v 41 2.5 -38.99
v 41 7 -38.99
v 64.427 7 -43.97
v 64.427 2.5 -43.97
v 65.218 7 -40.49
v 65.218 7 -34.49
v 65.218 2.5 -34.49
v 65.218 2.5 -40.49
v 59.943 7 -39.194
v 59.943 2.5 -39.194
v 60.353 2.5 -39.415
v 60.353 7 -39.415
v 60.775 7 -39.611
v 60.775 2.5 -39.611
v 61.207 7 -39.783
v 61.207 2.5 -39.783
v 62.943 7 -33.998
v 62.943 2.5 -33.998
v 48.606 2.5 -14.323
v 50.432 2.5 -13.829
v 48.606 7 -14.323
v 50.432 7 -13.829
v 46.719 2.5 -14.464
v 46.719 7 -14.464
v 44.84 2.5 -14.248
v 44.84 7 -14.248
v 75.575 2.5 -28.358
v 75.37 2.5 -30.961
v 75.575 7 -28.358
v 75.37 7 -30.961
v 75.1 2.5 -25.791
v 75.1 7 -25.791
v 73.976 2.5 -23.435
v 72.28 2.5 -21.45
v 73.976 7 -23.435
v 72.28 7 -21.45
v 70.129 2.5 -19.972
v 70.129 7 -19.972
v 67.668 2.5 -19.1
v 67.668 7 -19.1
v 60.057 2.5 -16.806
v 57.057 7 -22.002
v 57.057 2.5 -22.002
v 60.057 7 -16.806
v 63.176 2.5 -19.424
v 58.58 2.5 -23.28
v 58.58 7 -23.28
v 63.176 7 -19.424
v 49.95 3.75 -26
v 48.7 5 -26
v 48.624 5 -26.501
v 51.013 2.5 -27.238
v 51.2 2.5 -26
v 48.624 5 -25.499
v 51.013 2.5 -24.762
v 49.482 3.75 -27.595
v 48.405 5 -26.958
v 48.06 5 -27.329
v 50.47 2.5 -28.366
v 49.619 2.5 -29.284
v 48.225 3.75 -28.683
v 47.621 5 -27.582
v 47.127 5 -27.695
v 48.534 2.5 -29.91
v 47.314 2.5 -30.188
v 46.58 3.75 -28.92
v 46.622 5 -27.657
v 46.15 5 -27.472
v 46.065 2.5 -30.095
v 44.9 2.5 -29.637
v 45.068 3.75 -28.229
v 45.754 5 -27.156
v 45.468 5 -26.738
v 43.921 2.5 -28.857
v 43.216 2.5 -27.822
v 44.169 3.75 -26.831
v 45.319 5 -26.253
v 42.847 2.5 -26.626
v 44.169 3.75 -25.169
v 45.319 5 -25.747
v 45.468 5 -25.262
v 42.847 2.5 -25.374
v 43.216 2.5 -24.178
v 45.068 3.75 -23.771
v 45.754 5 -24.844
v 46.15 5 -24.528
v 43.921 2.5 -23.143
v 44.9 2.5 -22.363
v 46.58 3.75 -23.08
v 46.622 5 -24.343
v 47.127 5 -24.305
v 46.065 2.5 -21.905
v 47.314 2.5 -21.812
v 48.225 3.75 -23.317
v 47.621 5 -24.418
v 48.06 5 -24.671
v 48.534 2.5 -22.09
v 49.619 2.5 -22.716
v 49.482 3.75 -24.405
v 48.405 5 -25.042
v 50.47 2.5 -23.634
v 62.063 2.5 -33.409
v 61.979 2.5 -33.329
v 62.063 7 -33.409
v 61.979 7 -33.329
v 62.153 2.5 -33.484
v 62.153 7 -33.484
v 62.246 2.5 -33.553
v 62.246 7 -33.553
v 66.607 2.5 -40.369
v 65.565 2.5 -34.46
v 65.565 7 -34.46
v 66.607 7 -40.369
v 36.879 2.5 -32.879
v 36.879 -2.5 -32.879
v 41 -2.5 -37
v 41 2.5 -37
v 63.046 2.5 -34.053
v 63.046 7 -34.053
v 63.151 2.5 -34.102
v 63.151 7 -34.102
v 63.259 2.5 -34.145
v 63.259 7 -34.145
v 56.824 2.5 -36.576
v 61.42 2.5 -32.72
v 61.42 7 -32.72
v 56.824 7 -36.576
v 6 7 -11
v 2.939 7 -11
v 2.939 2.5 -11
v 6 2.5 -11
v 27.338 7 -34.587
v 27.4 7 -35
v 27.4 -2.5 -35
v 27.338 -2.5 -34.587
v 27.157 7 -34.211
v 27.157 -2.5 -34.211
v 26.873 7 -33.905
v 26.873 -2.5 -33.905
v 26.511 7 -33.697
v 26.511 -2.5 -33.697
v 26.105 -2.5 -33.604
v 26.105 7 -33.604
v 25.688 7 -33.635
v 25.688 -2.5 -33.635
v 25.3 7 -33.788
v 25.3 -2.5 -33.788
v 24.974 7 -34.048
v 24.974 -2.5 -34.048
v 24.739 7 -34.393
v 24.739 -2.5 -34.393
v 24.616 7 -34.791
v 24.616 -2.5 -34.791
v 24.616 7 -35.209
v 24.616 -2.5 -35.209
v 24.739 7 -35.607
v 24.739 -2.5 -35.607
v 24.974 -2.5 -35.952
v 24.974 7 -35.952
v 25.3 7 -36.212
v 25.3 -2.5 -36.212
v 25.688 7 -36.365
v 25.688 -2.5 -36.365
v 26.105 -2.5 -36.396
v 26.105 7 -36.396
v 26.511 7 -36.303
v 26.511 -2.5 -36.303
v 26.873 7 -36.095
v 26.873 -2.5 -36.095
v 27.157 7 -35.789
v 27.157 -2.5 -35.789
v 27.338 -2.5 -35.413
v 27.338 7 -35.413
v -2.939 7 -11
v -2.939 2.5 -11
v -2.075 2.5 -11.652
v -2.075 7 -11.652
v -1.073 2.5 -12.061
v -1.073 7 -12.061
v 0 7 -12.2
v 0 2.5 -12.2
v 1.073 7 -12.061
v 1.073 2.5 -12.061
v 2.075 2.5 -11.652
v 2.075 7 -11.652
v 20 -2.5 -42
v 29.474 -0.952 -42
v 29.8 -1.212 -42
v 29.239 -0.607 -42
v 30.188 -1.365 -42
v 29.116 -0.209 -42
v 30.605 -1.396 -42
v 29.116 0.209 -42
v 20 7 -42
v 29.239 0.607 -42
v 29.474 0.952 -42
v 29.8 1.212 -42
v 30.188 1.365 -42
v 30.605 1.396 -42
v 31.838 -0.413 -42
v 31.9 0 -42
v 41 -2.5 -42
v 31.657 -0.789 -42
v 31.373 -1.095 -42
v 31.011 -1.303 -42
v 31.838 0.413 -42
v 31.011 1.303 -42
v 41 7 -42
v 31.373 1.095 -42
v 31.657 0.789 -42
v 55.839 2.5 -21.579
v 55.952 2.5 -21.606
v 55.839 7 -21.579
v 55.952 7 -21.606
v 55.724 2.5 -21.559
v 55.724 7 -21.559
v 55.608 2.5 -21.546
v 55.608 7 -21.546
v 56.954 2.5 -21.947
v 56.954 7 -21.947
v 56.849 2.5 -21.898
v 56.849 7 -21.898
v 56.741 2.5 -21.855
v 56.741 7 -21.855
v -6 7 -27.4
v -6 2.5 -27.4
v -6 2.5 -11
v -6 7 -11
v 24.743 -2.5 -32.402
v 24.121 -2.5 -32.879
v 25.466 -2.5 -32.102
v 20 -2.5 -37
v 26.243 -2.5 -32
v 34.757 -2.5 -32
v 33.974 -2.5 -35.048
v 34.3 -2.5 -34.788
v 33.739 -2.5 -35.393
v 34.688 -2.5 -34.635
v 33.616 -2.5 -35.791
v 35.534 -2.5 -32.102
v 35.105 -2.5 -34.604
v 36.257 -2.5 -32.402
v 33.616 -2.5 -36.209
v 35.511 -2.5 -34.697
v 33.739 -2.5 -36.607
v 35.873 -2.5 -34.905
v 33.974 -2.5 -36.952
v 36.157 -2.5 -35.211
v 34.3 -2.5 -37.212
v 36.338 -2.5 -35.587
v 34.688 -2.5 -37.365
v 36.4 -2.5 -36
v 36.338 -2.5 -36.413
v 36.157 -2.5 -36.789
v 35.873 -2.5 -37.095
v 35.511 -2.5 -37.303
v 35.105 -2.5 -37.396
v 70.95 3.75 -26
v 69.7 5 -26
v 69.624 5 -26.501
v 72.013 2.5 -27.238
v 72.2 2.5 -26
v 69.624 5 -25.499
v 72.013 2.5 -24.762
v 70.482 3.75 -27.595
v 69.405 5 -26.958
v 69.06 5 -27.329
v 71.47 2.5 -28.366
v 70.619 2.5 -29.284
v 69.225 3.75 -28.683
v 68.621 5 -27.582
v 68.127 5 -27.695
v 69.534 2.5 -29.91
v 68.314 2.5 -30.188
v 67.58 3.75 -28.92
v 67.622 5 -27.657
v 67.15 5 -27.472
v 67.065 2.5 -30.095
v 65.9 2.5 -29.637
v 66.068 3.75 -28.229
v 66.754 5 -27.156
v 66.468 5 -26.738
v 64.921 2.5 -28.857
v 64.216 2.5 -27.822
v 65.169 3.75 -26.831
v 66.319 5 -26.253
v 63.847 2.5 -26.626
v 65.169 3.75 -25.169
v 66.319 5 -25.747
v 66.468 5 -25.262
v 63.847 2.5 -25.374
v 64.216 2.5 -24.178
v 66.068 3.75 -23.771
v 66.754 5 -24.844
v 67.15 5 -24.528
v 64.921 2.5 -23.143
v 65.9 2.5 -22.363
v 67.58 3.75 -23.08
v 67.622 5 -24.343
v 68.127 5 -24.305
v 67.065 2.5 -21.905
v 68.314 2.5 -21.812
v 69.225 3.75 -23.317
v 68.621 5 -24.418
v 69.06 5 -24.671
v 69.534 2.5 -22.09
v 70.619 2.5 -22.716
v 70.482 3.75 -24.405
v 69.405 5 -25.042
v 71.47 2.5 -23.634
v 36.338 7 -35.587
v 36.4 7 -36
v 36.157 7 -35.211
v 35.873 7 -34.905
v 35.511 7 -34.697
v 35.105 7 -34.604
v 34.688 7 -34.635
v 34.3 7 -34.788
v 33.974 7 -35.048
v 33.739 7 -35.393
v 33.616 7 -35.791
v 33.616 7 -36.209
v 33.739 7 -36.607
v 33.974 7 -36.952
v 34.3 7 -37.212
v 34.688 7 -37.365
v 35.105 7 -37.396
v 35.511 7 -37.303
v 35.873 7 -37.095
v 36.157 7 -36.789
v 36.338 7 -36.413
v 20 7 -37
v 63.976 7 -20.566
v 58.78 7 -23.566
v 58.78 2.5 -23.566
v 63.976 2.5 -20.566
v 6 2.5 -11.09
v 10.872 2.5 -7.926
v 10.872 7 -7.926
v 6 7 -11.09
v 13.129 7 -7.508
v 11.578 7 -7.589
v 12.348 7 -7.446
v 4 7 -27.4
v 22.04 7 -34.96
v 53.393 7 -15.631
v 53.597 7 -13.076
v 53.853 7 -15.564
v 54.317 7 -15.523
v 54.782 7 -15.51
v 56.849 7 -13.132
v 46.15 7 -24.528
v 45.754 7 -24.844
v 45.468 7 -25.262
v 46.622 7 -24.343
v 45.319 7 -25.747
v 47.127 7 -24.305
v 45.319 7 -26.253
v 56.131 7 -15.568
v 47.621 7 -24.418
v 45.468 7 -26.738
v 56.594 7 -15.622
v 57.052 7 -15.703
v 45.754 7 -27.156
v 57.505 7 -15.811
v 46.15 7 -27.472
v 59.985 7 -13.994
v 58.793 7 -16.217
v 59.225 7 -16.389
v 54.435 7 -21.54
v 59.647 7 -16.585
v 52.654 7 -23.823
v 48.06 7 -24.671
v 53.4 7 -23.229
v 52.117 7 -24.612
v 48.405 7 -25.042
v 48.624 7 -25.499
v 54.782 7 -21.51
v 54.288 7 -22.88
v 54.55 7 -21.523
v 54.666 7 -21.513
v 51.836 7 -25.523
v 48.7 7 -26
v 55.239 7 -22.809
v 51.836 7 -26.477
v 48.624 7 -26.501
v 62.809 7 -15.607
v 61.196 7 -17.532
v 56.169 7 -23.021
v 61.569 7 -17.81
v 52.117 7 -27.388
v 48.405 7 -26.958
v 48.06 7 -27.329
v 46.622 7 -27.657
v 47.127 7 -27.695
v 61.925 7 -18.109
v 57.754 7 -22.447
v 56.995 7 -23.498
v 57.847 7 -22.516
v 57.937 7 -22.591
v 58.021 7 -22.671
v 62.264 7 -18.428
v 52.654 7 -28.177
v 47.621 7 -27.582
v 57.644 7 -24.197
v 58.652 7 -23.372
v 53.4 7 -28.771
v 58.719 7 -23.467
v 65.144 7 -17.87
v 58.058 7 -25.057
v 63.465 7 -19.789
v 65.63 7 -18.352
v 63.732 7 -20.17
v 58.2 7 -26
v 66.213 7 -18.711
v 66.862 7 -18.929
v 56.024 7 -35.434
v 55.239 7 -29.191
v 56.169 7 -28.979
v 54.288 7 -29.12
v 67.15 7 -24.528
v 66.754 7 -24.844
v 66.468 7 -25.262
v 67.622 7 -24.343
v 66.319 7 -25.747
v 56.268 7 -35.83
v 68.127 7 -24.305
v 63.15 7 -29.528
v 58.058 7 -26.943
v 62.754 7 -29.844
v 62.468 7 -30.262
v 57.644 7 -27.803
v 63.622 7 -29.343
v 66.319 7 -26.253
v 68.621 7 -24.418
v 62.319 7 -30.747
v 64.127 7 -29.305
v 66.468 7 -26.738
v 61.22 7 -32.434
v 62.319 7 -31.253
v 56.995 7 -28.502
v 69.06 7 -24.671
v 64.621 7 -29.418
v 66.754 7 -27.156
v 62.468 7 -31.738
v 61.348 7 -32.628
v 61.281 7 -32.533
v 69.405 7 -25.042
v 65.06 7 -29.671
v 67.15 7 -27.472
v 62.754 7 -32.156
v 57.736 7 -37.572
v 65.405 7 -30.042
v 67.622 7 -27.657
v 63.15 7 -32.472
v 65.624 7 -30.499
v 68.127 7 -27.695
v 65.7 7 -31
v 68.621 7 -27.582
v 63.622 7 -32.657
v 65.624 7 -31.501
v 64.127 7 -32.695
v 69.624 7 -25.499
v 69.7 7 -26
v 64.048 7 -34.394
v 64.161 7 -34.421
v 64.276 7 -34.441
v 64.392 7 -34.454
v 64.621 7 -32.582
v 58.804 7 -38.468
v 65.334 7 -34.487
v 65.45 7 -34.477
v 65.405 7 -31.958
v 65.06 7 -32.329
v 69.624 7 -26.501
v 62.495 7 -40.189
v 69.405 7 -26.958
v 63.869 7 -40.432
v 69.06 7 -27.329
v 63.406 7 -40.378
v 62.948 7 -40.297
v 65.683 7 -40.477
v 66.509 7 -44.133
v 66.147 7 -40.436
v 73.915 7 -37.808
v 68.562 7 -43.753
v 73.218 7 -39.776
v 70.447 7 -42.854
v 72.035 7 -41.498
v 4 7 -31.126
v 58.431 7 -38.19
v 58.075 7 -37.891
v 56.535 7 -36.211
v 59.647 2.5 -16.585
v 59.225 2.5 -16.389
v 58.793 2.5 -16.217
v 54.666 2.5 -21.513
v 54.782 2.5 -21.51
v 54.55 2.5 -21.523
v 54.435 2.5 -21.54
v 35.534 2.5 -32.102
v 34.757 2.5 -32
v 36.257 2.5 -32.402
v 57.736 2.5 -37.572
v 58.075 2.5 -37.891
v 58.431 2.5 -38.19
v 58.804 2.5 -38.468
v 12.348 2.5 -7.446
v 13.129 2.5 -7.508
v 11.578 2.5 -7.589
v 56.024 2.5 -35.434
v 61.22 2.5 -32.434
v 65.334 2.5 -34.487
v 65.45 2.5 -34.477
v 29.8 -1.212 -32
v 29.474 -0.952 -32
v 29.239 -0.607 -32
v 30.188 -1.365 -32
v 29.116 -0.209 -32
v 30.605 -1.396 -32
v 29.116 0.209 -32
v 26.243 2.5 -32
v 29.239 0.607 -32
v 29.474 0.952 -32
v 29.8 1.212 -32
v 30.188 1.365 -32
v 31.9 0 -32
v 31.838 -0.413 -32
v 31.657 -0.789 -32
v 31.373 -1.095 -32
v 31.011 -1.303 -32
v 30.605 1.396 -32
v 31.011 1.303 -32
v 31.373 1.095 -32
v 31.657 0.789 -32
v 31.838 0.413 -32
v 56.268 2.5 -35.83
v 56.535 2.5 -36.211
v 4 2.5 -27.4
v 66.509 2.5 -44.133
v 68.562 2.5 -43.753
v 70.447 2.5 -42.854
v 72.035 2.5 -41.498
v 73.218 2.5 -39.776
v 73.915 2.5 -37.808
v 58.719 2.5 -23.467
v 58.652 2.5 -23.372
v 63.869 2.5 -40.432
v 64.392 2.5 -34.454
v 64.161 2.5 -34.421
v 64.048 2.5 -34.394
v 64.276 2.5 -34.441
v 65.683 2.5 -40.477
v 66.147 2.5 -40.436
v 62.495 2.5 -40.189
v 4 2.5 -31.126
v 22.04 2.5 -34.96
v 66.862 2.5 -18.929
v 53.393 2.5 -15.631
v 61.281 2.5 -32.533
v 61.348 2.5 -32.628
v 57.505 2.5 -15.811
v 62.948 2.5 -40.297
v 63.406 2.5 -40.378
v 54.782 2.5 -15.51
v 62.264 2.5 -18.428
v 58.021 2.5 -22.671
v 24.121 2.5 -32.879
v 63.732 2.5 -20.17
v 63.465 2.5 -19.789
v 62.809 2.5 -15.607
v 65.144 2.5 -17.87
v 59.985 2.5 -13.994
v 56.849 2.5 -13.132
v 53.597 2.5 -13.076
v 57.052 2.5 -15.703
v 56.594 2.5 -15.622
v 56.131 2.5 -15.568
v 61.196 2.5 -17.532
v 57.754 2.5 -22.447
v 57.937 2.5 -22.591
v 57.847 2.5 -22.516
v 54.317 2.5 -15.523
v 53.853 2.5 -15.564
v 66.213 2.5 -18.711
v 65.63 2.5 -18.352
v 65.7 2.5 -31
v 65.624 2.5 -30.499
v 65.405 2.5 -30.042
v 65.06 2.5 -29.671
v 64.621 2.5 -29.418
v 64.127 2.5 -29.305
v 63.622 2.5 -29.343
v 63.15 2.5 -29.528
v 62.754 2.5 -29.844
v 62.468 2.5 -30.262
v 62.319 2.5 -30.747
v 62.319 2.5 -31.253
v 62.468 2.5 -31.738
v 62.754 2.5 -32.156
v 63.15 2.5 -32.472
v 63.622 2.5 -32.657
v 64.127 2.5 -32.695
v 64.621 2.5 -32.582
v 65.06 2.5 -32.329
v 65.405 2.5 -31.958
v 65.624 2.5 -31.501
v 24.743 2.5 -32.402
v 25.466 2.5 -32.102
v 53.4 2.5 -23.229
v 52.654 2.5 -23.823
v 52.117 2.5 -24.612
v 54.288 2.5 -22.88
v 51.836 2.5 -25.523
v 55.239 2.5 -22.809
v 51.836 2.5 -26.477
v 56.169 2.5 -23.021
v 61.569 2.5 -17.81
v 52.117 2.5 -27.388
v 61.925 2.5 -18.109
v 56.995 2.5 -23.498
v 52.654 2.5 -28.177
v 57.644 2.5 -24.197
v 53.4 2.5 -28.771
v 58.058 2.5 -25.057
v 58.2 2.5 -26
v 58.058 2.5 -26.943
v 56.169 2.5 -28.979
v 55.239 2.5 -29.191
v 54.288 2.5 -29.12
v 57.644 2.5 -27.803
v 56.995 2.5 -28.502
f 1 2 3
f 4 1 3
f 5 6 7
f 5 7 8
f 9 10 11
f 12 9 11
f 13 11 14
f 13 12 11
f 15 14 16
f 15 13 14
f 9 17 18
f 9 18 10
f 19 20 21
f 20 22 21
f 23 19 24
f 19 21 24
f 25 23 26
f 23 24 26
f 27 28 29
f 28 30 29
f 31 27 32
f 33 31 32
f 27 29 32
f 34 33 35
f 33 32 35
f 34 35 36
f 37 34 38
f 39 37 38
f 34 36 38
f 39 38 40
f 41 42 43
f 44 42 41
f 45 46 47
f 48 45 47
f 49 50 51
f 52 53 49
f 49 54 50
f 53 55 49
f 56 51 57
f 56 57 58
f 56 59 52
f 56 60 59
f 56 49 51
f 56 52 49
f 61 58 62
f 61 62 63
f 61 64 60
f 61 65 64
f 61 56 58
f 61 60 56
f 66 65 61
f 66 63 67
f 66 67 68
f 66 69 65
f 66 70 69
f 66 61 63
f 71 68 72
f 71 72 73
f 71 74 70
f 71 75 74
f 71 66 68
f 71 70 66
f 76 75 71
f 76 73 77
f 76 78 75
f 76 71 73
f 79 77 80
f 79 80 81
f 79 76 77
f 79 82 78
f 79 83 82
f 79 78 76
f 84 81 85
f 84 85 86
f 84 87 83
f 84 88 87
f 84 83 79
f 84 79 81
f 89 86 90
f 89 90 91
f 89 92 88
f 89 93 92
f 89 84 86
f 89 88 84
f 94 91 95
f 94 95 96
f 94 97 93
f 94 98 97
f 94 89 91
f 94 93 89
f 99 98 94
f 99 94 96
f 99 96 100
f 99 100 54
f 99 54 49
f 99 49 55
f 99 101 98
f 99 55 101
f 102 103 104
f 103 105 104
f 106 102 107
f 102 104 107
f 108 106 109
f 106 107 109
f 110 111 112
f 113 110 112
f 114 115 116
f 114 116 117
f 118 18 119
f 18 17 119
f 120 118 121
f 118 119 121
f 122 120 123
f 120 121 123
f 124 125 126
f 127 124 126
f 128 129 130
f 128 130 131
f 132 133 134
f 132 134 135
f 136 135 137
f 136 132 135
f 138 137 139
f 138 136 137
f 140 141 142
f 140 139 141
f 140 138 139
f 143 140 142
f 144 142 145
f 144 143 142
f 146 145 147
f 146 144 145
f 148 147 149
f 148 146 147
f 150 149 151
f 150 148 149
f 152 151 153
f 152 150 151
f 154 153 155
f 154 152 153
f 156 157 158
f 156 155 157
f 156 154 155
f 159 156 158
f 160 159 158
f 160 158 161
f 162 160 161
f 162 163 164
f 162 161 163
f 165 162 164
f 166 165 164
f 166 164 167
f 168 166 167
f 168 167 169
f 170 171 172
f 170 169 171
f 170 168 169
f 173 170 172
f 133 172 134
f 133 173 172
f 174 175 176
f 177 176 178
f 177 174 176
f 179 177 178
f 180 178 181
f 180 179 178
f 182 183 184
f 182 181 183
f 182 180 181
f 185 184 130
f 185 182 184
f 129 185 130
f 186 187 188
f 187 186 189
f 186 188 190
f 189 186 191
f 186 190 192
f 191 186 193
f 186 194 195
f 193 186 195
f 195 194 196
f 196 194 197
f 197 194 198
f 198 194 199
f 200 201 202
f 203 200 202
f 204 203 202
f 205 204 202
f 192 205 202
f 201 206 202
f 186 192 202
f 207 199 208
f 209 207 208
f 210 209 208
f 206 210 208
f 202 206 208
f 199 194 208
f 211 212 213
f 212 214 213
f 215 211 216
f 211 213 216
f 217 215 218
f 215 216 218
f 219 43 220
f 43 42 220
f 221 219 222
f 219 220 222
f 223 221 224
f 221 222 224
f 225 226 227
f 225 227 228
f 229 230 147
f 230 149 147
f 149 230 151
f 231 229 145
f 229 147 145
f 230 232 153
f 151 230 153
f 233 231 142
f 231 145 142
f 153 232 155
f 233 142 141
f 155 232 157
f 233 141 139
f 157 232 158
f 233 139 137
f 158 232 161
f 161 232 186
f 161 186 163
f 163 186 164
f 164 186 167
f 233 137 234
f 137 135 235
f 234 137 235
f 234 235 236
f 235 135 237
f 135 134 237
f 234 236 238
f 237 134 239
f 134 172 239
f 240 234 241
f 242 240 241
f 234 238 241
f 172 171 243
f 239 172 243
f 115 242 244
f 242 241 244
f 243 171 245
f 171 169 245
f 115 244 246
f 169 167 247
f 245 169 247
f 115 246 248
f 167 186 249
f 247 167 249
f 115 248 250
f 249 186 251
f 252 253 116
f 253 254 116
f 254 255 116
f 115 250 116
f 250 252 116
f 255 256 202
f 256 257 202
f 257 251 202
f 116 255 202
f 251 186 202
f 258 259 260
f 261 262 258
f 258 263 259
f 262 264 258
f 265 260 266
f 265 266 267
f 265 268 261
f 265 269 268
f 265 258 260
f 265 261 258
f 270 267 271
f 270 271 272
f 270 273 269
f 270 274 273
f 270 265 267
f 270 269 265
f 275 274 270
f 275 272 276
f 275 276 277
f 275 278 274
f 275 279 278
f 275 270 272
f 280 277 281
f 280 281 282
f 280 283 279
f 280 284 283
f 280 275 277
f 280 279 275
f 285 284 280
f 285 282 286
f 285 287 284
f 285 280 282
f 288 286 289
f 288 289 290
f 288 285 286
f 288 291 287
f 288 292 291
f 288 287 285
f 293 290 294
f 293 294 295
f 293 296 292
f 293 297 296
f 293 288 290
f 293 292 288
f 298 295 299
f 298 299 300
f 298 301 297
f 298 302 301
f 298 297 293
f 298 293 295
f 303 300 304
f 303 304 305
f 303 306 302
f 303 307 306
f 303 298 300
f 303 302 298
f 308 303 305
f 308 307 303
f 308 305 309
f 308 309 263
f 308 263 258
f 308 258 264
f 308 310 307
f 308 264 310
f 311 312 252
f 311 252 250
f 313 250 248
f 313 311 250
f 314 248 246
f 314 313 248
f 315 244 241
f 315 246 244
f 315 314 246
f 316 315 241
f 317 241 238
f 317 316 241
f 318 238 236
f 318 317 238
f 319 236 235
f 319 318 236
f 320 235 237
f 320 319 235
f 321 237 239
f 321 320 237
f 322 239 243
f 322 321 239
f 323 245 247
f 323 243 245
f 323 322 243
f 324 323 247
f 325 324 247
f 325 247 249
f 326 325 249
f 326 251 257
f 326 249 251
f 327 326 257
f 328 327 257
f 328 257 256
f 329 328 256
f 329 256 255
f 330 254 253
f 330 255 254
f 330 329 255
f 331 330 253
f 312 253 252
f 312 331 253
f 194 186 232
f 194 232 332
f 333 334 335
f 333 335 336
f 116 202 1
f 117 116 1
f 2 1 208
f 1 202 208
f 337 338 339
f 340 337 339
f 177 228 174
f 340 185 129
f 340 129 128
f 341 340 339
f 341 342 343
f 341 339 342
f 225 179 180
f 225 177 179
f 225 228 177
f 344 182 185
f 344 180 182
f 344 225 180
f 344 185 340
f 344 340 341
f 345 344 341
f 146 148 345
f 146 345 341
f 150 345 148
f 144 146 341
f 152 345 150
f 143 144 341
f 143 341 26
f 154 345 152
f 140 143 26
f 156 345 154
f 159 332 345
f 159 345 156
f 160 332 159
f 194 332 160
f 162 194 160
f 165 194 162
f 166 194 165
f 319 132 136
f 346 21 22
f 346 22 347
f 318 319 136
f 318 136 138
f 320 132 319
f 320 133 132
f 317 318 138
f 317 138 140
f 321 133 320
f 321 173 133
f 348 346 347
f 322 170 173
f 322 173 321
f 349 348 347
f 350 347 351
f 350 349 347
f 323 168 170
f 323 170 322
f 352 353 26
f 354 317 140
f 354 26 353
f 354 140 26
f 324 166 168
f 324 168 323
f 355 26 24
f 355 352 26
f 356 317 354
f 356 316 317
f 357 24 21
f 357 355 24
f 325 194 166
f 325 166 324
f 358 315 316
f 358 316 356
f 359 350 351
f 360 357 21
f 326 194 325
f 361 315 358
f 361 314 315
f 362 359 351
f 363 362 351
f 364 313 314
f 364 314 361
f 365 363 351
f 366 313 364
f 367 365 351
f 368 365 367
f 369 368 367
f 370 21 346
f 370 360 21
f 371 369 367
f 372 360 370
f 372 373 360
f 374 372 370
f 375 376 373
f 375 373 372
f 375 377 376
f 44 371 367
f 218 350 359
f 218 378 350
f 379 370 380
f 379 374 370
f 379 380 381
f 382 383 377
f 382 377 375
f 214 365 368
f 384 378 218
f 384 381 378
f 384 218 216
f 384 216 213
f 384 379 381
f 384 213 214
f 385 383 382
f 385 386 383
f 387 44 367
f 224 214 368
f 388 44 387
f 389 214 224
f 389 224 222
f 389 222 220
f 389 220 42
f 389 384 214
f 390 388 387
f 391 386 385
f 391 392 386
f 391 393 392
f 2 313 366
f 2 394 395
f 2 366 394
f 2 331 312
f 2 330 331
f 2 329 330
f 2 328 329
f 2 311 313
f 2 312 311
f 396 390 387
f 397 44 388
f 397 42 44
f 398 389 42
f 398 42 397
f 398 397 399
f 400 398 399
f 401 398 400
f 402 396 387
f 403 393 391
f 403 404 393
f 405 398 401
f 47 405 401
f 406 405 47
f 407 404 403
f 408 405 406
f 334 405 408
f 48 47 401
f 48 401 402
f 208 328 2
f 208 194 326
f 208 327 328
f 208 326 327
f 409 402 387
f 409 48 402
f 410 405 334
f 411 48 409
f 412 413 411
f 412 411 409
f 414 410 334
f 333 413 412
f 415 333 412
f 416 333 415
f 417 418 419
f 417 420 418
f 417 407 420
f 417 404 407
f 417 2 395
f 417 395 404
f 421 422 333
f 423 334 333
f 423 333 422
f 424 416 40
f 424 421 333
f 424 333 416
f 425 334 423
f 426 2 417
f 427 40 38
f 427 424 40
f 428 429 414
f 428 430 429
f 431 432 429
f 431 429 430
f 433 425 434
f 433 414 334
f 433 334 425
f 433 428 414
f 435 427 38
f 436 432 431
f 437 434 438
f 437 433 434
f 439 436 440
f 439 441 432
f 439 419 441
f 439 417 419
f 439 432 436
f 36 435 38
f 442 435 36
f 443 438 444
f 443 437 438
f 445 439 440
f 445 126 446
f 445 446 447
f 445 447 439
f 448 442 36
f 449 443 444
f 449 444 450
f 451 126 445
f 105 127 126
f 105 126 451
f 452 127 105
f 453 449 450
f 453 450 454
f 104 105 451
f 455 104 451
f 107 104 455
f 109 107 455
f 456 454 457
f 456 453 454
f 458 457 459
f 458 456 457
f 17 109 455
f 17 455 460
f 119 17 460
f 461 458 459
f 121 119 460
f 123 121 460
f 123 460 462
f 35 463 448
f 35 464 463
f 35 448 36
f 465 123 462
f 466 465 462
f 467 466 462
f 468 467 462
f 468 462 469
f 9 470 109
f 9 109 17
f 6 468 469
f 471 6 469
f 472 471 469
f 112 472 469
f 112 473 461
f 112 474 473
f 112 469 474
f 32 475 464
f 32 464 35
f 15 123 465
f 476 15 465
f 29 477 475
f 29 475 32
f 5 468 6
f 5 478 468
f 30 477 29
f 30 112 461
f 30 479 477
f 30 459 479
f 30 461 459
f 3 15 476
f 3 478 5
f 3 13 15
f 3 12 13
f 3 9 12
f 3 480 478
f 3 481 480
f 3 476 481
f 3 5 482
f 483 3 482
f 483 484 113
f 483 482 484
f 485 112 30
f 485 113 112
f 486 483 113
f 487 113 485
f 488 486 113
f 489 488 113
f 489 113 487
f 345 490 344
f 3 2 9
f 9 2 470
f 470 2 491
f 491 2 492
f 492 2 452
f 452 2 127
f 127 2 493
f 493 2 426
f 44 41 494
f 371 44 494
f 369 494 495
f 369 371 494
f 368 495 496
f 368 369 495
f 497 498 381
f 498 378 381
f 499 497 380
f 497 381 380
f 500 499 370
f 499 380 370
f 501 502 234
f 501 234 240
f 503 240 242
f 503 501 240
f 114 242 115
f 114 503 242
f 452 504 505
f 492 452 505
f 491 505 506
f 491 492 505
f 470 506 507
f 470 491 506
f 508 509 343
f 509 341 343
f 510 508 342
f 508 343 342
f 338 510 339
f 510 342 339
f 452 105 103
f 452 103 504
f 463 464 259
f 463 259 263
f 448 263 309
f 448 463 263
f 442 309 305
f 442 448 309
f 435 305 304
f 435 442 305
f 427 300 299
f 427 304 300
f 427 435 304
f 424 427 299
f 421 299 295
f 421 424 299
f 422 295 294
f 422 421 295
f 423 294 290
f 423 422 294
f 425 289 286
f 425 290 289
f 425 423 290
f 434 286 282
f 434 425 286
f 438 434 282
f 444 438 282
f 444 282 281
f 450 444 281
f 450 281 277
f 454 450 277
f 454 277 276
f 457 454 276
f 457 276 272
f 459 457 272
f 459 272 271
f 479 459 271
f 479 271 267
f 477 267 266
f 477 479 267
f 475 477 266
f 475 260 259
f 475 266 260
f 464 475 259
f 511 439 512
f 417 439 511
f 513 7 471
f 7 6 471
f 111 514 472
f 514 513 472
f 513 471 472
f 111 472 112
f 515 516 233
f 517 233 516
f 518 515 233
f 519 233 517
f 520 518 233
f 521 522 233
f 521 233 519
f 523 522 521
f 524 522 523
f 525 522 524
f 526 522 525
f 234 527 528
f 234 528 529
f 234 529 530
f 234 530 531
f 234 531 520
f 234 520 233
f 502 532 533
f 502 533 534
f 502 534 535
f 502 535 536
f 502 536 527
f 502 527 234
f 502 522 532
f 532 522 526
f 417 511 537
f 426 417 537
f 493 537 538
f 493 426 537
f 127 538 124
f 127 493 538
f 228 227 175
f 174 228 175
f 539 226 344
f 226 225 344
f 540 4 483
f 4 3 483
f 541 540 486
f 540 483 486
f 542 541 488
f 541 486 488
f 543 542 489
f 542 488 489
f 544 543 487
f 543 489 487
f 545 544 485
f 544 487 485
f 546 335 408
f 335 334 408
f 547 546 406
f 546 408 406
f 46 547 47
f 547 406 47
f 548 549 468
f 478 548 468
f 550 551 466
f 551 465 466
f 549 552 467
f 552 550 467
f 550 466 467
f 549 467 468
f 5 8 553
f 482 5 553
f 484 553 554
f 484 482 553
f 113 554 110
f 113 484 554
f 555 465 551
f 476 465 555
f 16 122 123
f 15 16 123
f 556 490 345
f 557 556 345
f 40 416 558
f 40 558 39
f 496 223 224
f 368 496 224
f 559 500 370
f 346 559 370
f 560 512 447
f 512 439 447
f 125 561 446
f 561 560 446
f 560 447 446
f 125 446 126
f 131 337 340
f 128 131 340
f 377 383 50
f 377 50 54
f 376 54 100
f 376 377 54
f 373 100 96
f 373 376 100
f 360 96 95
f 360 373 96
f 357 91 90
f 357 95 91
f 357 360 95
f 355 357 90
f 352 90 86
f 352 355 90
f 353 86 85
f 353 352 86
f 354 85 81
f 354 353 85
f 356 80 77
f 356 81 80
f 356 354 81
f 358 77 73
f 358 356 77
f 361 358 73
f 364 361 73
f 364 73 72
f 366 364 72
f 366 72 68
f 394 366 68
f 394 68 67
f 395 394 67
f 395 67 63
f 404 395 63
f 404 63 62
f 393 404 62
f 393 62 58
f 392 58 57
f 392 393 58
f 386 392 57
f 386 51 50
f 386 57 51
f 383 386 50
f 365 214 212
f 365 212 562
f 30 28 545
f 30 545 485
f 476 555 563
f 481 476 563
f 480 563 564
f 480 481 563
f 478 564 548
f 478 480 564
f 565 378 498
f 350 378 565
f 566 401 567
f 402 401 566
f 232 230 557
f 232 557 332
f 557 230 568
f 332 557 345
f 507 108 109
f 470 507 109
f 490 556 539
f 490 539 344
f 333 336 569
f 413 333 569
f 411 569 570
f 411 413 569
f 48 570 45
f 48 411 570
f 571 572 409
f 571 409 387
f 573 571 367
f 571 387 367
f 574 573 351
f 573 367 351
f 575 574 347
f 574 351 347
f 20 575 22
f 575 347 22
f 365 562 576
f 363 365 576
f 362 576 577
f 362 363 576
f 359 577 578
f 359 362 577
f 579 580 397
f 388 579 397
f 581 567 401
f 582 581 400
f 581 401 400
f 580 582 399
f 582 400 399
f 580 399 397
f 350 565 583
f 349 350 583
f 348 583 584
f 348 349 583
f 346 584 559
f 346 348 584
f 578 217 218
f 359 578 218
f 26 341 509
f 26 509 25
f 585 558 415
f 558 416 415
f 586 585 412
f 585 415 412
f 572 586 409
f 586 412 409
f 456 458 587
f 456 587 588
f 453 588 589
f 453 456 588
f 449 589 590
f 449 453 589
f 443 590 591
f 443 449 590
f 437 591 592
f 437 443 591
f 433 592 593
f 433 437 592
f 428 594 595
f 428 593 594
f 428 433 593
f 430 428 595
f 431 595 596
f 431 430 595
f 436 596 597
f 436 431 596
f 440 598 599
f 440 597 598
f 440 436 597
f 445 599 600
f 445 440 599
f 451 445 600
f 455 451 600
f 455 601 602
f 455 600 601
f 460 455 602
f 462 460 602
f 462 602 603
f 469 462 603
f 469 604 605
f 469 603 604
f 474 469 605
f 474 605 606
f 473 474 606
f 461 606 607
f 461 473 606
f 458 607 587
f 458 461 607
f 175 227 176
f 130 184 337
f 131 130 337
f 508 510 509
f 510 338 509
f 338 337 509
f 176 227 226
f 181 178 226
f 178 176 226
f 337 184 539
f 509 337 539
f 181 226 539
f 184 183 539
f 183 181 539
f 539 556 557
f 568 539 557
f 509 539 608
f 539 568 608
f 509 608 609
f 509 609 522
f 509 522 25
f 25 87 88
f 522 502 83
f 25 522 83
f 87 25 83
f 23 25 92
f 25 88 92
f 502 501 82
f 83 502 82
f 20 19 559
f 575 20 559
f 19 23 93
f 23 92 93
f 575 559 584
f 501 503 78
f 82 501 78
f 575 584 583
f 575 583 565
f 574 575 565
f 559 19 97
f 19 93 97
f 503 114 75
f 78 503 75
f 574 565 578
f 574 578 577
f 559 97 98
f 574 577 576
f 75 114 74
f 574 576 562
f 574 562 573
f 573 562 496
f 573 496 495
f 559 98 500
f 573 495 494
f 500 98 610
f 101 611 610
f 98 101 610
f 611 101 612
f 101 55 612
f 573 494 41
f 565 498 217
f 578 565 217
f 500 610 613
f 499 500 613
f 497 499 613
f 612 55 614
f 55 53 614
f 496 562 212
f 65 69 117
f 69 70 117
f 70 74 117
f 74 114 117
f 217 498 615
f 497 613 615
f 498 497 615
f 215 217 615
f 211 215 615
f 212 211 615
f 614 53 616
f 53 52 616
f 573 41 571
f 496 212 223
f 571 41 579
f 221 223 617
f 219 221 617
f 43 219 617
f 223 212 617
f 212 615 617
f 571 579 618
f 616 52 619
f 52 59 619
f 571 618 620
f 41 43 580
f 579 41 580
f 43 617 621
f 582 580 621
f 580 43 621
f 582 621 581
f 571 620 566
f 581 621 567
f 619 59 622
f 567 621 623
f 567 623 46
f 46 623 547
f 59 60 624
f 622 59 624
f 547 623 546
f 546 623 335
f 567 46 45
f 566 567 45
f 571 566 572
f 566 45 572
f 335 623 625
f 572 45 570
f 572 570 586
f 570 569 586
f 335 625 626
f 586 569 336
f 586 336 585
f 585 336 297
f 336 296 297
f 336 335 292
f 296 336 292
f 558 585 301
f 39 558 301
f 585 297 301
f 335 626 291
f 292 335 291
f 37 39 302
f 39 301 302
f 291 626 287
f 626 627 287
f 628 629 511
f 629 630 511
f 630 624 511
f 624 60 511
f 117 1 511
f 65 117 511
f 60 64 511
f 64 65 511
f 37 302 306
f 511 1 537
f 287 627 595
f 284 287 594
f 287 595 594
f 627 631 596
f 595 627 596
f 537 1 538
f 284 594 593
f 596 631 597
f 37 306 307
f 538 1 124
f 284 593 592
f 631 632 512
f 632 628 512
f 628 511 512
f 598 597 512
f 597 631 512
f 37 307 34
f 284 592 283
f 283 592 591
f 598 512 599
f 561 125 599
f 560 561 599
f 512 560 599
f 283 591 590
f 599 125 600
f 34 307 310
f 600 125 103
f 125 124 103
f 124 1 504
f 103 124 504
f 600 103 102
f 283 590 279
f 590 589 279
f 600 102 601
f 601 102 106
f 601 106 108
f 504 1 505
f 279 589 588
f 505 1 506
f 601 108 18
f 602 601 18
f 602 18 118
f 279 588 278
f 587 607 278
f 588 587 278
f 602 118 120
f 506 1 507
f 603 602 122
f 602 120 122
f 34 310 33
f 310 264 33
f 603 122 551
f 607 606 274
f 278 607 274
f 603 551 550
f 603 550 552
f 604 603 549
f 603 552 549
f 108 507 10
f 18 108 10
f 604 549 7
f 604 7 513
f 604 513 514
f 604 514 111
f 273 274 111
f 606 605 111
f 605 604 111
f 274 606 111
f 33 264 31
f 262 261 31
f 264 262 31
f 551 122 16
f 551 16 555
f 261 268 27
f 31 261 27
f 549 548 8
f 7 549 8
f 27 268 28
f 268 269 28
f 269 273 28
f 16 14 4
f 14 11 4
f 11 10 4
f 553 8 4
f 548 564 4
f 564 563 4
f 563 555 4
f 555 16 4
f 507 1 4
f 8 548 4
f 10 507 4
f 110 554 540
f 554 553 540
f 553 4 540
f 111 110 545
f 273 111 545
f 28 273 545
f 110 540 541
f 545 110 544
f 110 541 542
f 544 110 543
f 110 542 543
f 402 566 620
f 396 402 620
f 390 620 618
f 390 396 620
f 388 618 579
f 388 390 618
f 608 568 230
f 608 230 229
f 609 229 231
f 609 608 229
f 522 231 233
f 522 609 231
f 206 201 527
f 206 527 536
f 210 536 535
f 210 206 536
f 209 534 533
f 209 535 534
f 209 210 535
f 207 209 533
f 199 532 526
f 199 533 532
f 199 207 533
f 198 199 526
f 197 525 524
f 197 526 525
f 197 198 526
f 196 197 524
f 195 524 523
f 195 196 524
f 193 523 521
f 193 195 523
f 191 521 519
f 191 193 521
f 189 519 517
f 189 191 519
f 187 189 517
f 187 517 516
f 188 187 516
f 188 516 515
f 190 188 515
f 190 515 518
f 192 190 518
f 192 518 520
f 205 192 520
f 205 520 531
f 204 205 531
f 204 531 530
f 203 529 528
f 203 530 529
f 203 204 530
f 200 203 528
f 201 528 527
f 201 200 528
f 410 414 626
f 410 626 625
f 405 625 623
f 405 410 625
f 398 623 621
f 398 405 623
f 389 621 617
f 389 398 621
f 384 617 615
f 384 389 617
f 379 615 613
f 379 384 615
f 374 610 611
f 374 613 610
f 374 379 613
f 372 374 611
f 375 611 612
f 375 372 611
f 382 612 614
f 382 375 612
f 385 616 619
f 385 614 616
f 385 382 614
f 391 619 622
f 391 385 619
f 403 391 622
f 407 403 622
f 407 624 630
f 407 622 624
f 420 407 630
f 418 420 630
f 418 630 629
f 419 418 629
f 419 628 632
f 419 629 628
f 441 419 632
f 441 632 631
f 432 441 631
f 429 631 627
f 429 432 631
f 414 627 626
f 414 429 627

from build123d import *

# Parameters (mm, degrees)
CYLINDER088_R                = 1.4
CYLINDER088_DEPTH            = 20
CYLINDER088_ROLL_ANGLE       = 90
CYLINDER089_R                = 1.4
CYLINDER089_DEPTH            = 30
CYLINDER087_R                = 1.4
CYLINDER087_DEPTH            = 20
CYLINDER087_ROLL_ANGLE       = 90
BOX001027025_W               = 21
BOX001027025_H               = 9.5
BOX001027025_DEPTH           = 10
CHAMFER007_SIZE              = 5
FILLET013_R                  = 3
CYLINDER085_R                = 1.7
CYLINDER085_DEPTH            = 10
CYLINDER085_ROLL_ANGLE       = 90
CYLINDER084_R                = 1.7
CYLINDER084_DEPTH            = 10
CYLINDER084_ROLL_ANGLE       = 90
CYLINDER086_R                = 4.2
CYLINDER086_DEPTH            = 18
CYLINDER086_ROLL_ANGLE       = 90
BOX001027021_W               = 15
BOX001027021_H               = 24
BOX001027021_DEPTH           = 10.6
BOX001027029_W               = 2
BOX001027029_H               = 20
BOX001027029_DEPTH           = 13
CYLINDER094_R                = 2
CYLINDER094_DEPTH            = 26
CYLINDER094_ROLL_ANGLE       = 90
CYLINDER095_R                = 8
CYLINDER095_DEPTH            = 18
CYLINDER095_ROLL_ANGLE       = 90
BOX001027028_W               = 13
BOX001027028_H               = 20
BOX001027028_DEPTH           = 2
BOX001027028_PLACEMENT_ANGLE = 80
COMMON039_PITCH_ANGLE        = 10
COMMON040_PLACEMENT_ANGLE    = 25
COMMON041_PITCH_ANGLE        = -20
COMMON042_PITCH_ANGLE        = -35
COMMON038_PITCH_ANGLE        = -5
FUSION094_PLACEMENT_ANGLE    = 205
CYLINDER091_R                = 1.7
CYLINDER091_DEPTH            = 20
CYLINDER091_ROLL_ANGLE       = 90
CYLINDER090_R                = 3.2
CYLINDER090_DEPTH            = 20
CYLINDER090_ROLL_ANGLE       = 90
BOX001027027_W               = 2
BOX001027027_H               = 20
BOX001027027_DEPTH           = 13
CYLINDER092_R                = 2
CYLINDER092_DEPTH            = 26
CYLINDER092_ROLL_ANGLE       = 90
CYLINDER093_R                = 8
CYLINDER093_DEPTH            = 18
CYLINDER093_ROLL_ANGLE       = 90
BOX001027026_W               = 13
BOX001027026_H               = 20
BOX001027026_DEPTH           = 2
BOX001027026_PLACEMENT_ANGLE = 80
COMMON034_PITCH_ANGLE        = 10
COMMON035_PLACEMENT_ANGLE    = 25
COMMON036_PITCH_ANGLE        = -20
COMMON037_PITCH_ANGLE        = -35
COMMON033_PITCH_ANGLE        = -5
FUSION093_PLACEMENT_ANGLE    = 25
BOX001027024_W               = 80
BOX001027024_H               = 4.5
BOX001027024_DEPTH           = 25
BOX001027024_PITCH_ANGLE     = 12
CHAMFER006_SIZE              = 13
BOX001027022_W               = 12
BOX001027022_H               = 4.5
BOX001027022_DEPTH           = 17
CYLINDER096_R                = 13
CYLINDER096_DEPTH            = 4.5
CYLINDER096_ROLL_ANGLE       = 90
FILLET014_R                  = 8
FILLET015_R                  = 10
FILLET016_R                  = 3
FILLET017_R                  = 10
FILLET018_R                  = 3
CHAMFER009_SIZE              = 2.5


with BuildPart() as cylinder088:
    # Cylinder088 → Cylinder088 (new body)
    with BuildSketch(Plane.XY):
        Circle(CYLINDER088_R)
    extrude(amount=CYLINDER088_DEPTH)


with BuildPart() as cylinder088_1:
    # Cylinder088 roll: moved
    add(cylinder088.part.rotate(Axis((0, 0, 0), (1, 0, 0)), CYLINDER088_ROLL_ANGLE))


with BuildPart() as cylinder088_2:
    # Cylinder088 placement: moved
    add(cylinder088_1.part.moved(Location((26, 10, -35))))


with BuildPart() as cylinder089:
    # Cylinder089 → Cylinder089 (new body)
    with BuildSketch(Plane(origin=(30.5, 0, -55), x_dir=(1, 0, 0), z_dir=(0, 0, 1))):
        Circle(CYLINDER089_R)
    extrude(amount=CYLINDER089_DEPTH)


with BuildPart() as base_block_holes:
    # Cylinder087 → Cylinder087 (new body)
    with BuildSketch(Plane.XY):
        Circle(CYLINDER087_R)
    extrude(amount=CYLINDER087_DEPTH)


with BuildPart() as base_block_holes_1:
    # Cylinder087 roll: moved
    add(base_block_holes.part.rotate(Axis((0, 0, 0), (1, 0, 0)), CYLINDER087_ROLL_ANGLE))


with BuildPart() as base_block_holes_2:
    # Cylinder087 placement: moved
    add(base_block_holes_1.part.moved(Location((35, 10, -36))))

    # Fusion105: union Cylinder088, Cylinder089
    add(cylinder088_2.part)
    add(cylinder089.part)


with BuildPart() as fillet013:
    # Box001027025 → Box001027025 (new body)
    with BuildSketch(Plane(origin=(20, -2.5, -42), x_dir=(1, 0, 0), z_dir=(0, 0, 1))):
        with Locations((10.5, 4.75)):
            Rectangle(BOX001027025_W, BOX001027025_H)
    extrude(amount=BOX001027025_DEPTH)

    # Chamfer007
    chamfer007_edges = [fillet013.edges().sort_by_distance(p)[0] for p in [
        (20, 2.25, -32),
        (41, 2.25, -32),
    ]]
    chamfer(chamfer007_edges, length=CHAMFER007_SIZE)

    # Fillet013
    fillet013_edges = [fillet013.edges().sort_by_distance(p)[0] for p in [
        (25, 2.25, -32),
        (36, 2.25, -32),
    ]]
    fillet(fillet013_edges, radius=FILLET013_R)


with BuildPart() as cylinder160:
    # Cylinder085 → Cylinder085 (new body)
    with BuildSketch(Plane.XY):
        Circle(CYLINDER085_R)
    extrude(amount=CYLINDER085_DEPTH)


with BuildPart() as cylinder160_1:
    # Cylinder085 roll: moved
    add(cylinder160.part.rotate(Axis((0, 0, 0), (1, 0, 0)), CYLINDER085_ROLL_ANGLE))


with BuildPart() as cylinder160_2:
    # Cylinder085 placement: moved
    add(cylinder160_1.part.moved(Location((47, 10, -26))))


with BuildPart() as mounting_holes001:
    # Cylinder084 → Cylinder084 (new body)
    with BuildSketch(Plane.XY):
        Circle(CYLINDER084_R)
    extrude(amount=CYLINDER084_DEPTH)


with BuildPart() as mounting_holes001_1:
    # Cylinder084 roll: moved
    add(mounting_holes001.part.rotate(Axis((0, 0, 0), (1, 0, 0)), CYLINDER084_ROLL_ANGLE))


with BuildPart() as mounting_holes001_2:
    # Cylinder084 placement: moved
    add(mounting_holes001_1.part.moved(Location((68, 10, -26))))

    # Fusion096: union Cylinder160
    add(cylinder160_2.part)


with BuildPart() as cylinder086:
    # Cylinder086 → Cylinder086 (new body)
    with BuildSketch(Plane.XY):
        Circle(CYLINDER086_R)
    extrude(amount=CYLINDER086_DEPTH)


with BuildPart() as cylinder086_1:
    # Cylinder086 roll: moved
    add(cylinder086.part.rotate(Axis((0, 0, 0), (1, 0, 0)), CYLINDER086_ROLL_ANGLE))


with BuildPart() as cylinder086_2:
    # Cylinder086 placement: moved
    add(cylinder086_1.part.moved(Location((0, 9, -8))))


with BuildPart() as cube041:
    # Box001027021 → Box001027021 (new body)
    with BuildSketch(Plane(origin=(-11, -13, -38), x_dir=(1, 0, 0), z_dir=(0, 0, 1))):
        with Locations((7.5, 12)):
            Rectangle(BOX001027021_W, BOX001027021_H)
    extrude(amount=BOX001027021_DEPTH)


with BuildPart() as cube049:
    # Box001027029 → Box001027029 (new body)
    with BuildSketch(Plane(origin=(0, -10, 0), x_dir=(1, 0, 0), z_dir=(0, 0, 1))):
        with Locations((1, 10)):
            Rectangle(BOX001027029_W, BOX001027029_H)
    extrude(amount=BOX001027029_DEPTH)


with BuildPart() as cylinder161:
    # Cylinder094 → Cylinder094 (new body)
    with BuildSketch(Plane.XY):
        Circle(CYLINDER094_R)
    extrude(amount=CYLINDER094_DEPTH)


with BuildPart() as cylinder161_1:
    # Cylinder094 roll: moved
    add(cylinder161.part.rotate(Axis((0, 0, 0), (1, 0, 0)), CYLINDER094_ROLL_ANGLE))


with BuildPart() as cylinder161_2:
    # Cylinder094 placement: moved
    add(cylinder161_1.part.moved(Location((0, 12, 0))))


with BuildPart() as cut049:
    # Cylinder095 → Cylinder095 (new body)
    with BuildSketch(Plane.XY):
        Circle(CYLINDER095_R)
    extrude(amount=CYLINDER095_DEPTH)


with BuildPart() as cut049_1:
    # Cylinder095 roll: moved
    add(cut049.part.rotate(Axis((0, 0, 0), (1, 0, 0)), CYLINDER095_ROLL_ANGLE))


with BuildPart() as cut049_2:
    # Cylinder095 placement: moved
    add(cut049_1.part.moved(Location((0, 9, 0))))

    # Cut049: cut Cylinder161
    add(cylinder161_2.part, mode=Mode.SUBTRACT)


with BuildPart() as cube048:
    # Box001027028 → Box001027028 (new body)
    with BuildSketch(Plane.XY):
        with Locations((6.5, 10)):
            Rectangle(BOX001027028_W, BOX001027028_H)
    extrude(amount=BOX001027028_DEPTH)


with BuildPart() as cube048_1:
    # Box001027028 placement: moved
    add(cube048.part.moved(Location((0, -10, 0))).rotate(Axis((0, -10, 0), (0, -1, 0)), BOX001027028_PLACEMENT_ANGLE))


with BuildPart() as common039:
    # Common039 base: copy of Cube048
    add(cube048_1.part)

    # Common039: intersect Cube049, Cut049
    add(cube049.part, mode=Mode.INTERSECT)
    add(cut049_2.part, mode=Mode.INTERSECT)


with BuildPart() as common039_1:
    # Common039 pitch: moved
    add(common039.part.rotate(Axis((0, 0, 0), (0, 1, 0)), COMMON039_PITCH_ANGLE))


with BuildPart() as common039_2:
    # Common039 placement: moved
    add(common039_1.part.moved(Location((0.647048, 0, 2.414815))))


with BuildPart() as common040:
    # Common040 base: copy of Cube048
    add(cube048_1.part)

    # Common040: intersect Cube049, Cut049
    add(cube049.part, mode=Mode.INTERSECT)
    add(cut049_2.part, mode=Mode.INTERSECT)


with BuildPart() as common040_1:
    # Common040 placement: moved
    add(common040.part.moved(Location((1.25, 0, 2.165064))).rotate(Axis((1.25, 0, 2.165064), (0, 1, 0)), COMMON040_PLACEMENT_ANGLE))


with BuildPart() as common041:
    # Common041 base: copy of Cube048
    add(cube048_1.part)

    # Common041: intersect Cube049, Cut049
    add(cube049.part, mode=Mode.INTERSECT)
    add(cut049_2.part, mode=Mode.INTERSECT)


with BuildPart() as common041_1:
    # Common041 pitch: moved
    add(common041.part.rotate(Axis((0, 0, 0), (0, 1, 0)), COMMON041_PITCH_ANGLE))


with BuildPart() as common041_2:
    # Common041 placement: moved
    add(common041_1.part.moved(Location((-0.647048, 0, 2.414815))))


with BuildPart() as common042:
    # Common042 base: copy of Cube048
    add(cube048_1.part)

    # Common042: intersect Cube049, Cut049
    add(cube049.part, mode=Mode.INTERSECT)
    add(cut049_2.part, mode=Mode.INTERSECT)


with BuildPart() as common042_1:
    # Common042 pitch: moved
    add(common042.part.rotate(Axis((0, 0, 0), (0, 1, 0)), COMMON042_PITCH_ANGLE))


with BuildPart() as common042_2:
    # Common042 placement: moved
    add(common042_1.part.moved(Location((-1.25, 0, 2.165064))))


with BuildPart() as strength_slots009:
    # Common038 base: copy of Cube048
    add(cube048_1.part)

    # Common038: intersect Cube049, Cut049
    add(cube049.part, mode=Mode.INTERSECT)
    add(cut049_2.part, mode=Mode.INTERSECT)


with BuildPart() as strength_slots009_1:
    # Common038 pitch: moved
    add(strength_slots009.part.rotate(Axis((0, 0, 0), (0, 1, 0)), COMMON038_PITCH_ANGLE))


with BuildPart() as strength_slots009_2:
    # Common038 placement: moved
    add(strength_slots009_1.part.moved(Location((0, 0, 2.5))))

    # Fusion094: union Common039, Common040, Common041, Common042
    add(common039_2.part)
    add(common040_1.part)
    add(common041_2.part)
    add(common042_2.part)


with BuildPart() as strength_slots009_3:
    # Fusion094 placement: moved
    add(strength_slots009_2.part.moved(Location((65, 0, -30))).rotate(Axis((65, 0, -30), (0, 1, 0)), FUSION094_PLACEMENT_ANGLE))


with BuildPart() as cylinder091:
    # Cylinder091 → Cylinder091 (new body)
    with BuildSketch(Plane.XY):
        Circle(CYLINDER091_R)
    extrude(amount=CYLINDER091_DEPTH)


with BuildPart() as cylinder091_1:
    # Cylinder091 roll: moved
    add(cylinder091.part.rotate(Axis((0, 0, 0), (1, 0, 0)), CYLINDER091_ROLL_ANGLE))


with BuildPart() as cylinder091_2:
    # Cylinder091 placement: moved
    add(cylinder091_1.part.moved(Location((64, 10, -31))))


with BuildPart() as cylinder090:
    # Cylinder090 → Cylinder090 (new body)
    with BuildSketch(Plane.XY):
        Circle(CYLINDER090_R)
    extrude(amount=CYLINDER090_DEPTH)


with BuildPart() as cylinder090_1:
    # Cylinder090 roll: moved
    add(cylinder090.part.rotate(Axis((0, 0, 0), (1, 0, 0)), CYLINDER090_ROLL_ANGLE))


with BuildPart() as cylinder090_2:
    # Cylinder090 placement: moved
    add(cylinder090_1.part.moved(Location((55, 10, -26))))


with BuildPart() as cube047:
    # Box001027027 → Box001027027 (new body)
    with BuildSketch(Plane(origin=(0, -10, 0), x_dir=(1, 0, 0), z_dir=(0, 0, 1))):
        with Locations((1, 10)):
            Rectangle(BOX001027027_W, BOX001027027_H)
    extrude(amount=BOX001027027_DEPTH)


with BuildPart() as cylinder092:
    # Cylinder092 → Cylinder092 (new body)
    with BuildSketch(Plane.XY):
        Circle(CYLINDER092_R)
    extrude(amount=CYLINDER092_DEPTH)


with BuildPart() as cylinder092_1:
    # Cylinder092 roll: moved
    add(cylinder092.part.rotate(Axis((0, 0, 0), (1, 0, 0)), CYLINDER092_ROLL_ANGLE))


with BuildPart() as cylinder092_2:
    # Cylinder092 placement: moved
    add(cylinder092_1.part.moved(Location((0, 12, 0))))


with BuildPart() as cut048:
    # Cylinder093 → Cylinder093 (new body)
    with BuildSketch(Plane.XY):
        Circle(CYLINDER093_R)
    extrude(amount=CYLINDER093_DEPTH)


with BuildPart() as cut048_1:
    # Cylinder093 roll: moved
    add(cut048.part.rotate(Axis((0, 0, 0), (1, 0, 0)), CYLINDER093_ROLL_ANGLE))


with BuildPart() as cut048_2:
    # Cylinder093 placement: moved
    add(cut048_1.part.moved(Location((0, 9, 0))))

    # Cut048: cut Cylinder092
    add(cylinder092_2.part, mode=Mode.SUBTRACT)


with BuildPart() as cube046:
    # Box001027026 → Box001027026 (new body)
    with BuildSketch(Plane.XY):
        with Locations((6.5, 10)):
            Rectangle(BOX001027026_W, BOX001027026_H)
    extrude(amount=BOX001027026_DEPTH)


with BuildPart() as cube046_1:
    # Box001027026 placement: moved
    add(cube046.part.moved(Location((0, -10, 0))).rotate(Axis((0, -10, 0), (0, -1, 0)), BOX001027026_PLACEMENT_ANGLE))


with BuildPart() as common034:
    # Common034 base: copy of Cube046
    add(cube046_1.part)

    # Common034: intersect Cube047, Cut048
    add(cube047.part, mode=Mode.INTERSECT)
    add(cut048_2.part, mode=Mode.INTERSECT)


with BuildPart() as common034_1:
    # Common034 pitch: moved
    add(common034.part.rotate(Axis((0, 0, 0), (0, 1, 0)), COMMON034_PITCH_ANGLE))


with BuildPart() as common034_2:
    # Common034 placement: moved
    add(common034_1.part.moved(Location((0.647048, 0, 2.414815))))


with BuildPart() as common035:
    # Common035 base: copy of Cube046
    add(cube046_1.part)

    # Common035: intersect Cube047, Cut048
    add(cube047.part, mode=Mode.INTERSECT)
    add(cut048_2.part, mode=Mode.INTERSECT)


with BuildPart() as common035_1:
    # Common035 placement: moved
    add(common035.part.moved(Location((1.25, 0, 2.165064))).rotate(Axis((1.25, 0, 2.165064), (0, 1, 0)), COMMON035_PLACEMENT_ANGLE))


with BuildPart() as common036:
    # Common036 base: copy of Cube046
    add(cube046_1.part)

    # Common036: intersect Cube047, Cut048
    add(cube047.part, mode=Mode.INTERSECT)
    add(cut048_2.part, mode=Mode.INTERSECT)


with BuildPart() as common036_1:
    # Common036 pitch: moved
    add(common036.part.rotate(Axis((0, 0, 0), (0, 1, 0)), COMMON036_PITCH_ANGLE))


with BuildPart() as common036_2:
    # Common036 placement: moved
    add(common036_1.part.moved(Location((-0.647048, 0, 2.414815))))


with BuildPart() as common037:
    # Common037 base: copy of Cube046
    add(cube046_1.part)

    # Common037: intersect Cube047, Cut048
    add(cube047.part, mode=Mode.INTERSECT)
    add(cut048_2.part, mode=Mode.INTERSECT)


with BuildPart() as common037_1:
    # Common037 pitch: moved
    add(common037.part.rotate(Axis((0, 0, 0), (0, 1, 0)), COMMON037_PITCH_ANGLE))


with BuildPart() as common037_2:
    # Common037 placement: moved
    add(common037_1.part.moved(Location((-1.25, 0, 2.165064))))


with BuildPart() as common_holes:
    # Common033 base: copy of Cube046
    add(cube046_1.part)

    # Common033: intersect Cube047, Cut048
    add(cube047.part, mode=Mode.INTERSECT)
    add(cut048_2.part, mode=Mode.INTERSECT)


with BuildPart() as common_holes_1:
    # Common033 pitch: moved
    add(common_holes.part.rotate(Axis((0, 0, 0), (0, 1, 0)), COMMON033_PITCH_ANGLE))


with BuildPart() as common_holes_2:
    # Common033 placement: moved
    add(common_holes_1.part.moved(Location((0, 0, 2.5))))

    # Fusion093: union Common034, Common035, Common036, Common037
    add(common034_2.part)
    add(common035_1.part)
    add(common036_2.part)
    add(common037_2.part)


with BuildPart() as common_holes_3:
    # Fusion093 placement: moved
    add(common_holes_2.part.moved(Location((55, 0, -26))).rotate(Axis((55, 0, -26), (0, 1, 0)), FUSION093_PLACEMENT_ANGLE))

    # Fusion097: union strength-slots009, Cylinder091, Cylinder090
    add(strength_slots009_3.part)
    add(cylinder091_2.part)
    add(cylinder090_2.part)

    # Fusion098: union Cube041
    add(cube041.part)


with BuildPart() as chamfer006:
    # Box001027024 → Box001027024 (new body)
    with BuildSketch(Plane.XY):
        with Locations((40, 2.25)):
            Rectangle(BOX001027024_W, BOX001027024_H)
    extrude(amount=BOX001027024_DEPTH)


with BuildPart() as chamfer006_1:
    # Box001027024 pitch: moved
    add(chamfer006.part.rotate(Axis((0, 0, 0), (0, 1, 0)), BOX001027024_PITCH_ANGLE))


with BuildPart() as chamfer006_2:
    # Box001027024 placement: moved
    add(chamfer006_1.part.moved(Location((-6, 2.5, -29))))

    # Chamfer006
    chamfer006_edges = [chamfer006_2.edges().sort_by_distance(p)[0] for p in [
        (-0.802208, 4.75, -4.54631),
    ]]
    chamfer(chamfer006_edges, length=CHAMFER006_SIZE)


with BuildPart() as cube042:
    # Box001027022 → Box001027022 (new body)
    with BuildSketch(Plane(origin=(-6, 2.5, -28), x_dir=(1, 0, 0), z_dir=(0, 0, 1))):
        with Locations((6, 2.25)):
            Rectangle(BOX001027022_W, BOX001027022_H)
    extrude(amount=BOX001027022_DEPTH)


with BuildPart() as cut_holder_base:
    # Cylinder096 → Cylinder096 (new body)
    with BuildSketch(Plane.XY):
        Circle(CYLINDER096_R)
    extrude(amount=CYLINDER096_DEPTH)


with BuildPart() as cut_holder_base_1:
    # Cylinder096 roll: moved
    add(cut_holder_base.part.rotate(Axis((0, 0, 0), (1, 0, 0)), CYLINDER096_ROLL_ANGLE))


with BuildPart() as cut_holder_base_2:
    # Cylinder096 placement: moved
    add(cut_holder_base_1.part.moved(Location((55, 7, -26))))

    # Fusion095: union Chamfer006, Cube042
    add(chamfer006_2.part)
    add(cube042.part)

    # Cut050: cut common-holes
    add(common_holes_3.part, mode=Mode.SUBTRACT)

    # Cut051: cut Cylinder086
    add(cylinder086_2.part, mode=Mode.SUBTRACT)

    # Fillet014
    fillet014_edges = [cut_holder_base_2.edges().sort_by_distance(p)[0] for p in [
        (72.251808, 4.75, -45.632935),
    ]]
    fillet(fillet014_edges, radius=FILLET014_R)

    # Fillet015
    fillet015_edges = [cut_holder_base_2.edges().sort_by_distance(p)[0] for p in [
        (77.4496, 4.75, -21.179245),
    ]]
    fillet(fillet015_edges, radius=FILLET015_R)

    # Fillet016
    fillet016_edges = [cut_holder_base_2.edges().sort_by_distance(p)[0] for p in [
        (65.751998, 4.75, -18.692843),
    ]]
    fillet(fillet016_edges, radius=FILLET016_R)

    # Fillet017
    fillet017_edges = [cut_holder_base_2.edges().sort_by_distance(p)[0] for p in [
        (48.14965, 4.75, -14.951348),
    ]]
    fillet(fillet017_edges, radius=FILLET017_R)

    # Fillet018
    fillet018_edges = [cut_holder_base_2.edges().sort_by_distance(p)[0] for p in [
        (11.913711, 4.75, -7.249162),
    ]]
    fillet(fillet018_edges, radius=FILLET018_R)

    # Cut056: cut mounting-holes001
    add(mounting_holes001_2.part, mode=Mode.SUBTRACT)

    # Chamfer009
    chamfer009_edges = [cut_holder_base_2.edges().sort_by_distance(p)[0] for p in [
        (69.162118, 2.5, -24.759242),
        (69.162118, 2.5, -27.240758),
        (66.3, 2.5, -26),
        (45.3, 2.5, -26),
    ]]
    chamfer(chamfer009_edges, length=CHAMFER009_SIZE)

    # Fusion104: union Fillet013
    add(fillet013.part)

    # Cut057: cut base-block-holes
    add(base_block_holes_2.part, mode=Mode.SUBTRACT)


solid = cut_holder_base_2.part
